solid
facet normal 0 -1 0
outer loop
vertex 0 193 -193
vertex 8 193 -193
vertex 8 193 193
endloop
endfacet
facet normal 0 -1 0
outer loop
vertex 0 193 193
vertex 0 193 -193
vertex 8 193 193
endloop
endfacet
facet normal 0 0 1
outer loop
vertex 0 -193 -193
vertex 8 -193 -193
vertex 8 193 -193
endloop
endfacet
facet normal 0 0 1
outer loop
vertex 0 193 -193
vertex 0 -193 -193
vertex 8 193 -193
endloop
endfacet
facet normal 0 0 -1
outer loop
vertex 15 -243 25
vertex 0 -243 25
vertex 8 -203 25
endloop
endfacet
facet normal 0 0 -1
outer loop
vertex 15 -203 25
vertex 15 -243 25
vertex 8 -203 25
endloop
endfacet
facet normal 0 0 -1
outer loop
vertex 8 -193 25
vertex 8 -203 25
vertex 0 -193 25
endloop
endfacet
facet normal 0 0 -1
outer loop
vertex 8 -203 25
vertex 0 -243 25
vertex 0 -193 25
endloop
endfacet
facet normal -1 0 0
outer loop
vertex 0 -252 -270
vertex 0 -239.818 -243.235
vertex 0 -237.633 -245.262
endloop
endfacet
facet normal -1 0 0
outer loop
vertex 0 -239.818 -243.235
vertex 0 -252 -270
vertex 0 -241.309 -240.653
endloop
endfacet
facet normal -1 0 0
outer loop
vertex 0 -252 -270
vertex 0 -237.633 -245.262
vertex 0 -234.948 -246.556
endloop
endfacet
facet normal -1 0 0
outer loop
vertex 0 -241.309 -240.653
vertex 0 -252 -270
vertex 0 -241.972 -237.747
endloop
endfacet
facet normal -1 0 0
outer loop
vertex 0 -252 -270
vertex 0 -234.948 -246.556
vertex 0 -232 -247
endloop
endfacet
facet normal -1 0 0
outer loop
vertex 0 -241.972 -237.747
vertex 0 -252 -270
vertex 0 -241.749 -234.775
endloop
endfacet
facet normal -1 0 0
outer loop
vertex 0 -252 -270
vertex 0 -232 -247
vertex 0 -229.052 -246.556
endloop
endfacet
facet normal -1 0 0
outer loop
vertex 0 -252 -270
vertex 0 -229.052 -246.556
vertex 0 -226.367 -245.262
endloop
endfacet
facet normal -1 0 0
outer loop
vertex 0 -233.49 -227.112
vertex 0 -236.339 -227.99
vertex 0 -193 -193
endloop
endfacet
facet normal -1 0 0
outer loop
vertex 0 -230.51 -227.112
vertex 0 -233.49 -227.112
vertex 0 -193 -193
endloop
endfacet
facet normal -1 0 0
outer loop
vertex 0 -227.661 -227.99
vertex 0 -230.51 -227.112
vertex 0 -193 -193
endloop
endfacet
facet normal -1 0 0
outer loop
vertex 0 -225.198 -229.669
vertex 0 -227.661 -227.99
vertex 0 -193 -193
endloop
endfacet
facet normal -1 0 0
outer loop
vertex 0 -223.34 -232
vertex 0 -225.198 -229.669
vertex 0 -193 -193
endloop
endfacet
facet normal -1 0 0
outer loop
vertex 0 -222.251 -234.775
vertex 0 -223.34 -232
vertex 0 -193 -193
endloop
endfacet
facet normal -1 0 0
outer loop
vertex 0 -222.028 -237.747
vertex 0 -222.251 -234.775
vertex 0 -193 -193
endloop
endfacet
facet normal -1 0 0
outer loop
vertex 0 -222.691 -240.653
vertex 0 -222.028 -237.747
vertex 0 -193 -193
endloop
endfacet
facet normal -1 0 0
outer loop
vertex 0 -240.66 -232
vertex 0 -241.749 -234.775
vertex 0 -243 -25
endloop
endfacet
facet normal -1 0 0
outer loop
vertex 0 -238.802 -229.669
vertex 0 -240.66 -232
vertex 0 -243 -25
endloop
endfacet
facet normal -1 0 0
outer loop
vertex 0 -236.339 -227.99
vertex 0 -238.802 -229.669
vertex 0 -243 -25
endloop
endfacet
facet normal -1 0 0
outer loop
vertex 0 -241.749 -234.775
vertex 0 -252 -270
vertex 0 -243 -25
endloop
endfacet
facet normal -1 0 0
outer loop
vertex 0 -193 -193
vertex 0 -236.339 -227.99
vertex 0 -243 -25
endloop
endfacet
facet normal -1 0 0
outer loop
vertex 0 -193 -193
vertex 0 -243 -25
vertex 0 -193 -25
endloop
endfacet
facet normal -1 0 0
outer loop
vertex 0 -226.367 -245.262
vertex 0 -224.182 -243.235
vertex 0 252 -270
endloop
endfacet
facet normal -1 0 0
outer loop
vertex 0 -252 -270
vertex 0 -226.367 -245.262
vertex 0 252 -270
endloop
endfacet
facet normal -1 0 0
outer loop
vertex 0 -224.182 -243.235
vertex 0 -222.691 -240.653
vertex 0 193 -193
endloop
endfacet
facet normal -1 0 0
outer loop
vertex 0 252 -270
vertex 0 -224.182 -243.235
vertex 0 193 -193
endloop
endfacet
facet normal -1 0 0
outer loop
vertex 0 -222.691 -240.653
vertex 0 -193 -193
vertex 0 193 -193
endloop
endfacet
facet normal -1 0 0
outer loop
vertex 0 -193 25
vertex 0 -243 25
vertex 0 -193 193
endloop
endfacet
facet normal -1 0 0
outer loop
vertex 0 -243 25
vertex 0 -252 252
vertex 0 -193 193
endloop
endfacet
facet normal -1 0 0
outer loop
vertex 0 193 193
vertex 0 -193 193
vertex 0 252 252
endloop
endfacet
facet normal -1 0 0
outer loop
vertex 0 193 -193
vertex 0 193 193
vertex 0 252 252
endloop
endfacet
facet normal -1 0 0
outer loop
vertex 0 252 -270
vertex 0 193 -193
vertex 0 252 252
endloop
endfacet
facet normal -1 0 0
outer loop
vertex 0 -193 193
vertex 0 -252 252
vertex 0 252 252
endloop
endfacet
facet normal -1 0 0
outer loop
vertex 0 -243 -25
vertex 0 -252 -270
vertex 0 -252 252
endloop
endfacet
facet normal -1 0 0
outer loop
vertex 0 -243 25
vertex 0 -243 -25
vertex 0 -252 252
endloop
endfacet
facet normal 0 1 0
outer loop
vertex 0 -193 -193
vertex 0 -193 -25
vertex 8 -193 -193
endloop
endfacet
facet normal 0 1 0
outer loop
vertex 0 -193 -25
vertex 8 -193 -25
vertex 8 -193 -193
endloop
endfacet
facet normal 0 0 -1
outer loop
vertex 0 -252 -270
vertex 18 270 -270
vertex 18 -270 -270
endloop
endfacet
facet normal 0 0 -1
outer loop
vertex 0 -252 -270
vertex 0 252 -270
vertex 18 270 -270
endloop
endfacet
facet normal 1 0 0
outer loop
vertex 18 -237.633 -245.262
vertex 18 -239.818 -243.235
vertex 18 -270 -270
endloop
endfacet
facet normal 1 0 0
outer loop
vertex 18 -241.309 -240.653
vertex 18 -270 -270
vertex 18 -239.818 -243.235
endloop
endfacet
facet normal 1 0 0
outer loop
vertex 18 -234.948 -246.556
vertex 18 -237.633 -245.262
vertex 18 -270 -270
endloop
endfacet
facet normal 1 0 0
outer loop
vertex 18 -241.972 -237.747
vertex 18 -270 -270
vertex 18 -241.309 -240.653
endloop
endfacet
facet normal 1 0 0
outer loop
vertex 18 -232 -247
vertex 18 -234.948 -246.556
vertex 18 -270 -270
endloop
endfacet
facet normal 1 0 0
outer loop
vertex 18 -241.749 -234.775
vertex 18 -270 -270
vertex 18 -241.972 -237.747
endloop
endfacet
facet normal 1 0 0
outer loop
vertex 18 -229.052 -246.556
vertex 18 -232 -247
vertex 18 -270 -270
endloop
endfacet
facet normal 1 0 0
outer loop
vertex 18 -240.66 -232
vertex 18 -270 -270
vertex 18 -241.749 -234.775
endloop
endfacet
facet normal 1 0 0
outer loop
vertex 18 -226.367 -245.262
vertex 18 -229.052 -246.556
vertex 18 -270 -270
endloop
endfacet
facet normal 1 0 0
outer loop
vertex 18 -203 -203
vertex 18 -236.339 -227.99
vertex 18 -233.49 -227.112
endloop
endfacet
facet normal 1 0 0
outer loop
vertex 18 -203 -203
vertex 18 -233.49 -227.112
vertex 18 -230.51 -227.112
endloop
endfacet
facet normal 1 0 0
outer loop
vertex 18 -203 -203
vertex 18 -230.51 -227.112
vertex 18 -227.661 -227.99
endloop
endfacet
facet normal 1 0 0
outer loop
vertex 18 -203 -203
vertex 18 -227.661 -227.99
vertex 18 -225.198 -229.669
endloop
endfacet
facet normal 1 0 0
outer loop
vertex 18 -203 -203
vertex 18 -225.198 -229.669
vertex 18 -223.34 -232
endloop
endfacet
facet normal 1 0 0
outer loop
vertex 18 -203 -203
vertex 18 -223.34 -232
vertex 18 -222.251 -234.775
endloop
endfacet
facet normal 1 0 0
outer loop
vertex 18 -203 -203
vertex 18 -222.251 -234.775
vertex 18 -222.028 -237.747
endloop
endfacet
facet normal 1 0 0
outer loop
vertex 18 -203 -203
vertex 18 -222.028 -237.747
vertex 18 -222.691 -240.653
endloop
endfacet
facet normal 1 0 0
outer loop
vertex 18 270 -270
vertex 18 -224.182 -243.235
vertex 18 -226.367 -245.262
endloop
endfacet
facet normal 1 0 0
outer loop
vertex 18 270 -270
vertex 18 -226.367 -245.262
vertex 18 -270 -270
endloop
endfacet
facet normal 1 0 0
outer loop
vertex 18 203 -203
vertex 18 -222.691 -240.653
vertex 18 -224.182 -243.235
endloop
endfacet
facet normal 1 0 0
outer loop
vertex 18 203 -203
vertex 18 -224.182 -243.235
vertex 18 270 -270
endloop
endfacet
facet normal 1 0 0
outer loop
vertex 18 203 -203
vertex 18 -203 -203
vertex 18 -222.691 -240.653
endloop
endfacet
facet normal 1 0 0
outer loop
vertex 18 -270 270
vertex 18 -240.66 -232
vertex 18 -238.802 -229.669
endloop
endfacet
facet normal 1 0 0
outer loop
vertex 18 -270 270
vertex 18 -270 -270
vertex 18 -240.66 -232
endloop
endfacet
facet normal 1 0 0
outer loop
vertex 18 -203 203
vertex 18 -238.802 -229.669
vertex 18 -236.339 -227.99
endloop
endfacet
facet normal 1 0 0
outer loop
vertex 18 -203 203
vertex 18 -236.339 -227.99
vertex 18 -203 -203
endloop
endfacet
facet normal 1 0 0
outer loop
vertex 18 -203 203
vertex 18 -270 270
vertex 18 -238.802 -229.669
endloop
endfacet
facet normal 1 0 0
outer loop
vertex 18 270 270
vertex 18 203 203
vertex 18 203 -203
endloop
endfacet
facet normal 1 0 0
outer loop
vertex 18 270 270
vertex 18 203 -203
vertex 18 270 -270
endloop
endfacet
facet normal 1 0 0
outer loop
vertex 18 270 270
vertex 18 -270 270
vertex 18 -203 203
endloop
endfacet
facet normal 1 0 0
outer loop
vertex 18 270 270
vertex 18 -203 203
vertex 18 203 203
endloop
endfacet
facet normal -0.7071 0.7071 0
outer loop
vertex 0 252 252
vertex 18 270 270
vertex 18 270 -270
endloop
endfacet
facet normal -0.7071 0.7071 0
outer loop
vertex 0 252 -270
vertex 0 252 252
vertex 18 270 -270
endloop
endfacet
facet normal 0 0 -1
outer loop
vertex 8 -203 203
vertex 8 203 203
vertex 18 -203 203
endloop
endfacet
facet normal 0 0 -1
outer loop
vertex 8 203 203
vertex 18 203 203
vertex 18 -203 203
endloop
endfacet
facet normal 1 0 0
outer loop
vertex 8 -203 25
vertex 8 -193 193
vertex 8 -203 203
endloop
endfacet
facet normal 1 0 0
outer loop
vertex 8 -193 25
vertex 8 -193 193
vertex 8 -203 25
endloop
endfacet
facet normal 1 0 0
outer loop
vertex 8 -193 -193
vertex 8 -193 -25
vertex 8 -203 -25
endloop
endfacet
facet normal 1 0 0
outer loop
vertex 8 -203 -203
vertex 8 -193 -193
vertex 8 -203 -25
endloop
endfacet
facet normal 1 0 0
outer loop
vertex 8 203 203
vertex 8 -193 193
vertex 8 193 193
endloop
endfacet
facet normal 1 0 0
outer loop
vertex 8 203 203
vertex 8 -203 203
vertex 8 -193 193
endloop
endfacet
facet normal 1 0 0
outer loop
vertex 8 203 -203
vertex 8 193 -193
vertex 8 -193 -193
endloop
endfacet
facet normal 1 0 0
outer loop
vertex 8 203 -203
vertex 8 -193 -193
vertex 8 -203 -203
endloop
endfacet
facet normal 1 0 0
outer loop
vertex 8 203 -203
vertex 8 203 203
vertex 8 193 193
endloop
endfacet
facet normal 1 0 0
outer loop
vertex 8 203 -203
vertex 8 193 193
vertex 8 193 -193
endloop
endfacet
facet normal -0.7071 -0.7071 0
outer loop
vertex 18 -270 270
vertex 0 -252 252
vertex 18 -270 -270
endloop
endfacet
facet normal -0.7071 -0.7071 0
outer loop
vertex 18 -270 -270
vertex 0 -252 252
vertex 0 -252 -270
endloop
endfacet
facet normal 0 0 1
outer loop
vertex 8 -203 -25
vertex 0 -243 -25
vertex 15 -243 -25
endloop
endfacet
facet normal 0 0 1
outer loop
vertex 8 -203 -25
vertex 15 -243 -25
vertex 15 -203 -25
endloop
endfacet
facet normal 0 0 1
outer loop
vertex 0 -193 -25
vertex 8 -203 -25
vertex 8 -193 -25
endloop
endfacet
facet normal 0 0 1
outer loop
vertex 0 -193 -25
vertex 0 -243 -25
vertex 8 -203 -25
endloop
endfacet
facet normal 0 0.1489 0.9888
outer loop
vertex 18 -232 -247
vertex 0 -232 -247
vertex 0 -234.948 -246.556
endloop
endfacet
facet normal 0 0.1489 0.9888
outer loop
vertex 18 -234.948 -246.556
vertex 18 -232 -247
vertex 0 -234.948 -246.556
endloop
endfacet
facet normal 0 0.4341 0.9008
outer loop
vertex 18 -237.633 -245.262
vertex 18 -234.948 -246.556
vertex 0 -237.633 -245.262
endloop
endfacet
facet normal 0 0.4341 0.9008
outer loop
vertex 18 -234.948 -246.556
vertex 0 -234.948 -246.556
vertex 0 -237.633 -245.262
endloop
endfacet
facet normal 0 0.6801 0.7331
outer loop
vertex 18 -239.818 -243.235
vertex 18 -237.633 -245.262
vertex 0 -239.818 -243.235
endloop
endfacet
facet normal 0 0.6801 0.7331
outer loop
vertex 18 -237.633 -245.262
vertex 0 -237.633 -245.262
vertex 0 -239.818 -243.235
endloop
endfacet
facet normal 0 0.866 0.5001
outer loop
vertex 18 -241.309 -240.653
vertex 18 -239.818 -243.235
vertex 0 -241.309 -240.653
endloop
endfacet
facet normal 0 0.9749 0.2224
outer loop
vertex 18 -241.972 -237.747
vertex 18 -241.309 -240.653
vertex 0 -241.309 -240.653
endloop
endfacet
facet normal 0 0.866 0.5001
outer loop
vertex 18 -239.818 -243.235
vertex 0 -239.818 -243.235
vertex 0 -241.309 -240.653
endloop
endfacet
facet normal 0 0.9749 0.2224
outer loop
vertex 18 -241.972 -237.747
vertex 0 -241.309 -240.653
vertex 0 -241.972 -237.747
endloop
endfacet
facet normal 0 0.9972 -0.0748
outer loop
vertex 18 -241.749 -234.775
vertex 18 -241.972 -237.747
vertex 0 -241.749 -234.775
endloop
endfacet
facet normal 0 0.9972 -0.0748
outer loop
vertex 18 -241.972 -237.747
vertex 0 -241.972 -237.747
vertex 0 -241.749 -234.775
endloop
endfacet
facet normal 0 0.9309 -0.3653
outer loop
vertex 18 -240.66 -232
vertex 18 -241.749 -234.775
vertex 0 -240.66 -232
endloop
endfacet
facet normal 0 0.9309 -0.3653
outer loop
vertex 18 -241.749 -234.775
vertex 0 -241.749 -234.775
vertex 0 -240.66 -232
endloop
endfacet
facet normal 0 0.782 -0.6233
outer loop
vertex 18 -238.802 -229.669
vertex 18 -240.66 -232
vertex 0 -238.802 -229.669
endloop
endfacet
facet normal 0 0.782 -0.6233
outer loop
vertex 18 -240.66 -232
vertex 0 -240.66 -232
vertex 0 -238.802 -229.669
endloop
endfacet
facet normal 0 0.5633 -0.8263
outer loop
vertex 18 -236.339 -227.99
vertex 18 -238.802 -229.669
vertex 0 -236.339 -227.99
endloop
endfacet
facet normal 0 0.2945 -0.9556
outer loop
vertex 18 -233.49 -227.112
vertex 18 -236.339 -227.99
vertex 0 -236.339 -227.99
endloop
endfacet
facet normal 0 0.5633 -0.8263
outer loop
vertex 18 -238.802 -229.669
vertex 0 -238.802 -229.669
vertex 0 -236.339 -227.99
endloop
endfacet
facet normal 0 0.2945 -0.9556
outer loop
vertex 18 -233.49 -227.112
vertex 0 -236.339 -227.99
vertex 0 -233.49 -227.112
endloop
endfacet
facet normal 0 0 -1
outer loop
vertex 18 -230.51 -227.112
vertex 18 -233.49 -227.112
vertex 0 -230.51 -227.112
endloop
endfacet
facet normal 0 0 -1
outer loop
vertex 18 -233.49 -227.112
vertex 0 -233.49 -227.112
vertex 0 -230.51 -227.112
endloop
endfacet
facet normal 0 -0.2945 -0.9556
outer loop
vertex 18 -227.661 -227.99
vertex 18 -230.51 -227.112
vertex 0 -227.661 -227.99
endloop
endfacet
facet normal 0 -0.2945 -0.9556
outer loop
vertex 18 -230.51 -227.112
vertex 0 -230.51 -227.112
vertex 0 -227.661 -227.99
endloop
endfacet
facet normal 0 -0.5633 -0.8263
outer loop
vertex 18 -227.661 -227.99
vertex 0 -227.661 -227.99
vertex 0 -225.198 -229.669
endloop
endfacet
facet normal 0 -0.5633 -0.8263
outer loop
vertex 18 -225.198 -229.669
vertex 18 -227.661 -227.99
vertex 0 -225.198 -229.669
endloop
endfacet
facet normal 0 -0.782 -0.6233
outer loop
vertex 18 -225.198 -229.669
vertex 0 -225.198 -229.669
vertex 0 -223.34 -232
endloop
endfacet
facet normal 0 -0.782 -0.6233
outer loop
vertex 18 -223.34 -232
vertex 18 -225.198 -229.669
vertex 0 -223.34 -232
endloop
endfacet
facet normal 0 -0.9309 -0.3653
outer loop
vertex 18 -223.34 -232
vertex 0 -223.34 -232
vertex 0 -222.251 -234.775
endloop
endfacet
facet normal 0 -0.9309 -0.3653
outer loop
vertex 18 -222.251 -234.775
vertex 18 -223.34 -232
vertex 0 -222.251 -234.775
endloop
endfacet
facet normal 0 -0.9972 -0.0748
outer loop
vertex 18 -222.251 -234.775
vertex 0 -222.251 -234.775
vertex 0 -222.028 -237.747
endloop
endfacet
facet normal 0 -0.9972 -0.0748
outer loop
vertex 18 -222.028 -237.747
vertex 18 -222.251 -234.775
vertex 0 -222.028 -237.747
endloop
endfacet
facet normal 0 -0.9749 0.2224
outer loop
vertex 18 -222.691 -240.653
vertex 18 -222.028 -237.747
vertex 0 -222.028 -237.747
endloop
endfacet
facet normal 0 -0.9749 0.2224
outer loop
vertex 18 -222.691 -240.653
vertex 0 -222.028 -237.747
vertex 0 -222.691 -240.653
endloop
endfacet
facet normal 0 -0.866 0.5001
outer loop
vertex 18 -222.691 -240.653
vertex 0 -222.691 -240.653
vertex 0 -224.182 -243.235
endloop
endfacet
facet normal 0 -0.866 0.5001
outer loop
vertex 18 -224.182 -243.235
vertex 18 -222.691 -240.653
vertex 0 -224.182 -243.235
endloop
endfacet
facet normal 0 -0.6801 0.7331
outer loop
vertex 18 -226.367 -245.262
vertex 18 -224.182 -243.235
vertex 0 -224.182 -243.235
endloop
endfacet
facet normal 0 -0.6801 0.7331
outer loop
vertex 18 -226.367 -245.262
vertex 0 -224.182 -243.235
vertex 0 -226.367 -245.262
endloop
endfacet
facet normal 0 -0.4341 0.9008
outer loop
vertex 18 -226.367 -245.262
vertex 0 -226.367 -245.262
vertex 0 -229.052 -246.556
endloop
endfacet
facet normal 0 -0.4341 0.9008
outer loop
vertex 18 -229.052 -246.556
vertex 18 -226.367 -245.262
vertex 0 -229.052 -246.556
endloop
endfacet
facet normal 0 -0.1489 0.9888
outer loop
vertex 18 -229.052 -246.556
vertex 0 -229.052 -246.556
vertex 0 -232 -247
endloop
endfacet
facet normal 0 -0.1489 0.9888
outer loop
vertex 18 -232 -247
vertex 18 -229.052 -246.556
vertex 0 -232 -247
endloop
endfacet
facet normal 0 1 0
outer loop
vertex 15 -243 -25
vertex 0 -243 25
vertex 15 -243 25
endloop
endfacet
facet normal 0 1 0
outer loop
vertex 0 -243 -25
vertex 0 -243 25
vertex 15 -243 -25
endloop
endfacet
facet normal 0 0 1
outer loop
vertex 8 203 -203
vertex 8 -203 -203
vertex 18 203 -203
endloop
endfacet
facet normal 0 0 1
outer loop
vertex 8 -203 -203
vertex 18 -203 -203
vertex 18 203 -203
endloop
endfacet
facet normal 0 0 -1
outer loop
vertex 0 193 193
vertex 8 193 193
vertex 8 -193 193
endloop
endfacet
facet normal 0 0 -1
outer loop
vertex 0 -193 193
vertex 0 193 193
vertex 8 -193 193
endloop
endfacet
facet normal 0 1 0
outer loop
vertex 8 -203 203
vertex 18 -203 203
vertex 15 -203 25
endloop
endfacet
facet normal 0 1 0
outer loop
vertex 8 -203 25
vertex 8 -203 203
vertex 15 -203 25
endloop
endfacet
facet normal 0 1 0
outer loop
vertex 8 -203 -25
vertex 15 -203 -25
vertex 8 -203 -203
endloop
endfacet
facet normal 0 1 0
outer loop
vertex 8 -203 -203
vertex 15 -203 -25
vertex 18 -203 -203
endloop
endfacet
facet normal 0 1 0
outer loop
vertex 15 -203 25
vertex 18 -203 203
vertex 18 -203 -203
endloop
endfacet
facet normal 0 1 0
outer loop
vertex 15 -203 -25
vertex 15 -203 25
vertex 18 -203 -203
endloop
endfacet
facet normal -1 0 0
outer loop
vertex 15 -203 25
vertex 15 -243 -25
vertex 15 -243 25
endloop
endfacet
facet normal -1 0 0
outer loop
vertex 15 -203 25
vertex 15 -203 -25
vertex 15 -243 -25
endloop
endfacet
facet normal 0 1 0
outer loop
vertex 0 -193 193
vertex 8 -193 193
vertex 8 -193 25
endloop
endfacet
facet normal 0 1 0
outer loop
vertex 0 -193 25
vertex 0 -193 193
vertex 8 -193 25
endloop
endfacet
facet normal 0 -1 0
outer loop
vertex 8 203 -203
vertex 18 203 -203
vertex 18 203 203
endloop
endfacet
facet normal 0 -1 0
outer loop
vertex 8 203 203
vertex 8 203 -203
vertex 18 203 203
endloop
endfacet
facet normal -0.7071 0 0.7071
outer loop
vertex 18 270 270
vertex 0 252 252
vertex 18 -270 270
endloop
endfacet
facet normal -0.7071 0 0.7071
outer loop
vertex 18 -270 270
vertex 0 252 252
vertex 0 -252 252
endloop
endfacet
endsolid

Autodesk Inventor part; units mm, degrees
ref_plane "YZ Plane" through (0, 0, 0) normal (1, 0, 0) x (0, 1, 0)
ref_plane "XZ Plane" through (0, 0, 0) normal (0, 1, 0) x (-1, 0, 0)
ref_plane "XY Plane" through (0, 0, 0) normal (0, 0, 1) x (1, 0, 0)
sketch "Skizze1" plane through (0, 0, 0) normal (1, 0, 0) x (0, 1, 0)
  line L0 (-270, 270) -> (270, 270)
  line L1 (270, 270) -> (270, -270)
  line L2 (270, -270) -> (-270, -270)
  line L3 (-270, -270) -> (-270, 270)
  line L4 (-378, 0) -> (378, 0) projected
  line L5 (0, -378) -> (0, 378) projected
  point P0 (0, 0)
  dimension "d0" = 540
  dimension "d1" = 540
extrude "Extrusion1" add sketch "Skizze1" along normal blind 18
sketch "Skizze2" plane through (18, 0, 0) normal (1, 0, 0) x (0, 0, -1)
  line L0 (-270, 270) -> (-270, -270) projected
  line L1 (-270, -270) -> (270, -270) projected
  line L2 (270, -270) -> (270, 270) projected
  line L3 (270, 270) -> (-270, 270) projected
  line L4 (-203, -203) -> (203, -203)
  line L5 (203, -203) -> (203, 203)
  line L6 (203, 203) -> (-203, 203)
  line L7 (-203, 203) -> (-203, -203)
  point P0 (0, 0)
  dimension "d4" = 67
  dimension "d5" = 67
  dimension "d6" = 67
  dimension "d7" = 67
extrude "Extrusion2" cut sketch "Skizze2" against normal blind 10 contours L7 L6 L5 L4
sketch "Skizze3" plane through (8, 0, 0) normal (1, 0, 0) x (0, 0, -1)
  line L0 (203, -203) -> (-203, -203) projected
  line L1 (203, 203) -> (203, -203) projected
  line L2 (-203, 203) -> (203, 203) projected
  line L3 (-203, -203) -> (-203, 203) projected
  line L4 (-193, -193) -> (193, -193)
  line L5 (193, -193) -> (193, 193)
  line L6 (193, 193) -> (-193, 193)
  line L7 (-193, 193) -> (-193, -193)
  point P0 (0, 0)
  dimension "d10" = 10
  dimension "d11" = 10
  dimension "d12" = 10
  dimension "d13" = 10
extrude "Extrusion3" cut sketch "Skizze3" against normal blind 8 contours L7 L6 L5 L4
sketch "Skizze6" plane through (0, 0, 0) normal (-1, 0, 0) x (0, 0, 1)
  line L0 (-193, -193) -> (-193, 193) projected
  line L1 (-193, 193) -> (193, 193) projected
  line L2 (193, 193) -> (193, -193) projected
  line L3 (193, -193) -> (-193, -193) projected
  line L4 (270, -270) -> (270, 270) projected
  line L5 (270, 270) -> (-270, 270) projected
  line L6 (-270, 270) -> (-270, -270) projected
  line L7 (-270, -270) -> (270, -270) projected
  line L8 (17.5, -201) -> (17.5, -210) projected
  line L9 (22, -201) -> (17.5, -201) projected
  line L10 (17.5, -210) -> (13, -210) projected
  line L11 (13, -197) -> (13, -210) projected
  line L12 (22, -197) -> (22, -201) projected
  line L13 (-200, -197) -> (200, -197) projected
  line L14 (11, -197) -> (11, -210) projected
  line L15 (2, -197) -> (2, -201) projected
  line L16 (6.5, -201) -> (2, -201) projected
  line L17 (6.5, -201) -> (6.5, -210) projected
  line L18 (11, -210) -> (6.5, -210) projected
  line L19 (-5, -197) -> (-5, -201) projected
  line L20 (-5, -201) -> (-9.5, -201) projected
  line L21 (-9.5, -201) -> (-9.5, -210) projected
  line L22 (-9.5, -210) -> (-14, -210) projected
  line L23 (-14, -197) -> (-14, -210) projected
  line L24 (-16, -197) -> (-16, -210) projected
  line L25 (-16, -210) -> (-20.5, -210) projected
  line L26 (-20.5, -201) -> (-20.5, -210) projected
  line L27 (-20.5, -201) -> (-25, -201) projected
  line L28 (-25, -197) -> (-25, -201) projected
  line L29 (-270, -270) -> (270, -270) projected
  line L30 (-25, -243) -> (-25, -193)
  line L31 (25, -243) -> (25, -193)
  line L32 (0, -378) -> (0, 378) projected
  line L33 (-378, 0) -> (378, 0) projected
  line L34 (25, -243) -> (-25, -243)
  line L35 (25, -193) -> (-25, -193)
  point P0 (0, 0)
  dimension "d34" = 50
  dimension "d37" = 50
chamfer "Fase1" distance 18 angle 45 1 edges at (0, -270, 0)
chamfer "Fase2" distance 18 angle 45 2 edges at (0, 270, 0) (0, 8.9997, 270)
extrude "Extrusion7" cut sketch "Skizze6" against normal blind 15 contours L0 L33 L32 L3 | L0 L1 L32 L33 | L3 L32 L13 L30 | L33 L2 L3 L32 | L32 L1 L2 L33 | L3 L31 L13 L32 | L13 L24 L25 L26 L27 L28 | L32 L34 L30 L27 L26 L25 L24 L13 L23 L22 L21 L20 L19 | L13 L15 L16 L17 L18 L14 L11 L10 L8 L9 L12 L31 L34 L32 | L19 L20 L21 L22 L23 L13 | L13 L14 L18 L17 L16 L15 | L12 L9 L8 L10 L11 L13
sketch "Skizze8" plane through (18, 0, 0) normal (1, 0, 0) x (0, 0, -1)
  point P0 (0, 0)
sketch "Skizze9" plane through (18, 0, 0) normal (1, 0, 0) x (0, 0, -1)
  line L0 (-270, -270) -> (270, -270) projected
  line L1 (270, 270) -> (270, -270)
  point P0 (0, 0)
  point P1 (237, -232)
  dimension "d40" = 38
  dimension "d41" = 33
hole "Bohrung2" at (18, -232, -237) direction (-1, 0, 0) diameter 20 depth 18 tip angle 118
properties part number "PV_Rahmen"
